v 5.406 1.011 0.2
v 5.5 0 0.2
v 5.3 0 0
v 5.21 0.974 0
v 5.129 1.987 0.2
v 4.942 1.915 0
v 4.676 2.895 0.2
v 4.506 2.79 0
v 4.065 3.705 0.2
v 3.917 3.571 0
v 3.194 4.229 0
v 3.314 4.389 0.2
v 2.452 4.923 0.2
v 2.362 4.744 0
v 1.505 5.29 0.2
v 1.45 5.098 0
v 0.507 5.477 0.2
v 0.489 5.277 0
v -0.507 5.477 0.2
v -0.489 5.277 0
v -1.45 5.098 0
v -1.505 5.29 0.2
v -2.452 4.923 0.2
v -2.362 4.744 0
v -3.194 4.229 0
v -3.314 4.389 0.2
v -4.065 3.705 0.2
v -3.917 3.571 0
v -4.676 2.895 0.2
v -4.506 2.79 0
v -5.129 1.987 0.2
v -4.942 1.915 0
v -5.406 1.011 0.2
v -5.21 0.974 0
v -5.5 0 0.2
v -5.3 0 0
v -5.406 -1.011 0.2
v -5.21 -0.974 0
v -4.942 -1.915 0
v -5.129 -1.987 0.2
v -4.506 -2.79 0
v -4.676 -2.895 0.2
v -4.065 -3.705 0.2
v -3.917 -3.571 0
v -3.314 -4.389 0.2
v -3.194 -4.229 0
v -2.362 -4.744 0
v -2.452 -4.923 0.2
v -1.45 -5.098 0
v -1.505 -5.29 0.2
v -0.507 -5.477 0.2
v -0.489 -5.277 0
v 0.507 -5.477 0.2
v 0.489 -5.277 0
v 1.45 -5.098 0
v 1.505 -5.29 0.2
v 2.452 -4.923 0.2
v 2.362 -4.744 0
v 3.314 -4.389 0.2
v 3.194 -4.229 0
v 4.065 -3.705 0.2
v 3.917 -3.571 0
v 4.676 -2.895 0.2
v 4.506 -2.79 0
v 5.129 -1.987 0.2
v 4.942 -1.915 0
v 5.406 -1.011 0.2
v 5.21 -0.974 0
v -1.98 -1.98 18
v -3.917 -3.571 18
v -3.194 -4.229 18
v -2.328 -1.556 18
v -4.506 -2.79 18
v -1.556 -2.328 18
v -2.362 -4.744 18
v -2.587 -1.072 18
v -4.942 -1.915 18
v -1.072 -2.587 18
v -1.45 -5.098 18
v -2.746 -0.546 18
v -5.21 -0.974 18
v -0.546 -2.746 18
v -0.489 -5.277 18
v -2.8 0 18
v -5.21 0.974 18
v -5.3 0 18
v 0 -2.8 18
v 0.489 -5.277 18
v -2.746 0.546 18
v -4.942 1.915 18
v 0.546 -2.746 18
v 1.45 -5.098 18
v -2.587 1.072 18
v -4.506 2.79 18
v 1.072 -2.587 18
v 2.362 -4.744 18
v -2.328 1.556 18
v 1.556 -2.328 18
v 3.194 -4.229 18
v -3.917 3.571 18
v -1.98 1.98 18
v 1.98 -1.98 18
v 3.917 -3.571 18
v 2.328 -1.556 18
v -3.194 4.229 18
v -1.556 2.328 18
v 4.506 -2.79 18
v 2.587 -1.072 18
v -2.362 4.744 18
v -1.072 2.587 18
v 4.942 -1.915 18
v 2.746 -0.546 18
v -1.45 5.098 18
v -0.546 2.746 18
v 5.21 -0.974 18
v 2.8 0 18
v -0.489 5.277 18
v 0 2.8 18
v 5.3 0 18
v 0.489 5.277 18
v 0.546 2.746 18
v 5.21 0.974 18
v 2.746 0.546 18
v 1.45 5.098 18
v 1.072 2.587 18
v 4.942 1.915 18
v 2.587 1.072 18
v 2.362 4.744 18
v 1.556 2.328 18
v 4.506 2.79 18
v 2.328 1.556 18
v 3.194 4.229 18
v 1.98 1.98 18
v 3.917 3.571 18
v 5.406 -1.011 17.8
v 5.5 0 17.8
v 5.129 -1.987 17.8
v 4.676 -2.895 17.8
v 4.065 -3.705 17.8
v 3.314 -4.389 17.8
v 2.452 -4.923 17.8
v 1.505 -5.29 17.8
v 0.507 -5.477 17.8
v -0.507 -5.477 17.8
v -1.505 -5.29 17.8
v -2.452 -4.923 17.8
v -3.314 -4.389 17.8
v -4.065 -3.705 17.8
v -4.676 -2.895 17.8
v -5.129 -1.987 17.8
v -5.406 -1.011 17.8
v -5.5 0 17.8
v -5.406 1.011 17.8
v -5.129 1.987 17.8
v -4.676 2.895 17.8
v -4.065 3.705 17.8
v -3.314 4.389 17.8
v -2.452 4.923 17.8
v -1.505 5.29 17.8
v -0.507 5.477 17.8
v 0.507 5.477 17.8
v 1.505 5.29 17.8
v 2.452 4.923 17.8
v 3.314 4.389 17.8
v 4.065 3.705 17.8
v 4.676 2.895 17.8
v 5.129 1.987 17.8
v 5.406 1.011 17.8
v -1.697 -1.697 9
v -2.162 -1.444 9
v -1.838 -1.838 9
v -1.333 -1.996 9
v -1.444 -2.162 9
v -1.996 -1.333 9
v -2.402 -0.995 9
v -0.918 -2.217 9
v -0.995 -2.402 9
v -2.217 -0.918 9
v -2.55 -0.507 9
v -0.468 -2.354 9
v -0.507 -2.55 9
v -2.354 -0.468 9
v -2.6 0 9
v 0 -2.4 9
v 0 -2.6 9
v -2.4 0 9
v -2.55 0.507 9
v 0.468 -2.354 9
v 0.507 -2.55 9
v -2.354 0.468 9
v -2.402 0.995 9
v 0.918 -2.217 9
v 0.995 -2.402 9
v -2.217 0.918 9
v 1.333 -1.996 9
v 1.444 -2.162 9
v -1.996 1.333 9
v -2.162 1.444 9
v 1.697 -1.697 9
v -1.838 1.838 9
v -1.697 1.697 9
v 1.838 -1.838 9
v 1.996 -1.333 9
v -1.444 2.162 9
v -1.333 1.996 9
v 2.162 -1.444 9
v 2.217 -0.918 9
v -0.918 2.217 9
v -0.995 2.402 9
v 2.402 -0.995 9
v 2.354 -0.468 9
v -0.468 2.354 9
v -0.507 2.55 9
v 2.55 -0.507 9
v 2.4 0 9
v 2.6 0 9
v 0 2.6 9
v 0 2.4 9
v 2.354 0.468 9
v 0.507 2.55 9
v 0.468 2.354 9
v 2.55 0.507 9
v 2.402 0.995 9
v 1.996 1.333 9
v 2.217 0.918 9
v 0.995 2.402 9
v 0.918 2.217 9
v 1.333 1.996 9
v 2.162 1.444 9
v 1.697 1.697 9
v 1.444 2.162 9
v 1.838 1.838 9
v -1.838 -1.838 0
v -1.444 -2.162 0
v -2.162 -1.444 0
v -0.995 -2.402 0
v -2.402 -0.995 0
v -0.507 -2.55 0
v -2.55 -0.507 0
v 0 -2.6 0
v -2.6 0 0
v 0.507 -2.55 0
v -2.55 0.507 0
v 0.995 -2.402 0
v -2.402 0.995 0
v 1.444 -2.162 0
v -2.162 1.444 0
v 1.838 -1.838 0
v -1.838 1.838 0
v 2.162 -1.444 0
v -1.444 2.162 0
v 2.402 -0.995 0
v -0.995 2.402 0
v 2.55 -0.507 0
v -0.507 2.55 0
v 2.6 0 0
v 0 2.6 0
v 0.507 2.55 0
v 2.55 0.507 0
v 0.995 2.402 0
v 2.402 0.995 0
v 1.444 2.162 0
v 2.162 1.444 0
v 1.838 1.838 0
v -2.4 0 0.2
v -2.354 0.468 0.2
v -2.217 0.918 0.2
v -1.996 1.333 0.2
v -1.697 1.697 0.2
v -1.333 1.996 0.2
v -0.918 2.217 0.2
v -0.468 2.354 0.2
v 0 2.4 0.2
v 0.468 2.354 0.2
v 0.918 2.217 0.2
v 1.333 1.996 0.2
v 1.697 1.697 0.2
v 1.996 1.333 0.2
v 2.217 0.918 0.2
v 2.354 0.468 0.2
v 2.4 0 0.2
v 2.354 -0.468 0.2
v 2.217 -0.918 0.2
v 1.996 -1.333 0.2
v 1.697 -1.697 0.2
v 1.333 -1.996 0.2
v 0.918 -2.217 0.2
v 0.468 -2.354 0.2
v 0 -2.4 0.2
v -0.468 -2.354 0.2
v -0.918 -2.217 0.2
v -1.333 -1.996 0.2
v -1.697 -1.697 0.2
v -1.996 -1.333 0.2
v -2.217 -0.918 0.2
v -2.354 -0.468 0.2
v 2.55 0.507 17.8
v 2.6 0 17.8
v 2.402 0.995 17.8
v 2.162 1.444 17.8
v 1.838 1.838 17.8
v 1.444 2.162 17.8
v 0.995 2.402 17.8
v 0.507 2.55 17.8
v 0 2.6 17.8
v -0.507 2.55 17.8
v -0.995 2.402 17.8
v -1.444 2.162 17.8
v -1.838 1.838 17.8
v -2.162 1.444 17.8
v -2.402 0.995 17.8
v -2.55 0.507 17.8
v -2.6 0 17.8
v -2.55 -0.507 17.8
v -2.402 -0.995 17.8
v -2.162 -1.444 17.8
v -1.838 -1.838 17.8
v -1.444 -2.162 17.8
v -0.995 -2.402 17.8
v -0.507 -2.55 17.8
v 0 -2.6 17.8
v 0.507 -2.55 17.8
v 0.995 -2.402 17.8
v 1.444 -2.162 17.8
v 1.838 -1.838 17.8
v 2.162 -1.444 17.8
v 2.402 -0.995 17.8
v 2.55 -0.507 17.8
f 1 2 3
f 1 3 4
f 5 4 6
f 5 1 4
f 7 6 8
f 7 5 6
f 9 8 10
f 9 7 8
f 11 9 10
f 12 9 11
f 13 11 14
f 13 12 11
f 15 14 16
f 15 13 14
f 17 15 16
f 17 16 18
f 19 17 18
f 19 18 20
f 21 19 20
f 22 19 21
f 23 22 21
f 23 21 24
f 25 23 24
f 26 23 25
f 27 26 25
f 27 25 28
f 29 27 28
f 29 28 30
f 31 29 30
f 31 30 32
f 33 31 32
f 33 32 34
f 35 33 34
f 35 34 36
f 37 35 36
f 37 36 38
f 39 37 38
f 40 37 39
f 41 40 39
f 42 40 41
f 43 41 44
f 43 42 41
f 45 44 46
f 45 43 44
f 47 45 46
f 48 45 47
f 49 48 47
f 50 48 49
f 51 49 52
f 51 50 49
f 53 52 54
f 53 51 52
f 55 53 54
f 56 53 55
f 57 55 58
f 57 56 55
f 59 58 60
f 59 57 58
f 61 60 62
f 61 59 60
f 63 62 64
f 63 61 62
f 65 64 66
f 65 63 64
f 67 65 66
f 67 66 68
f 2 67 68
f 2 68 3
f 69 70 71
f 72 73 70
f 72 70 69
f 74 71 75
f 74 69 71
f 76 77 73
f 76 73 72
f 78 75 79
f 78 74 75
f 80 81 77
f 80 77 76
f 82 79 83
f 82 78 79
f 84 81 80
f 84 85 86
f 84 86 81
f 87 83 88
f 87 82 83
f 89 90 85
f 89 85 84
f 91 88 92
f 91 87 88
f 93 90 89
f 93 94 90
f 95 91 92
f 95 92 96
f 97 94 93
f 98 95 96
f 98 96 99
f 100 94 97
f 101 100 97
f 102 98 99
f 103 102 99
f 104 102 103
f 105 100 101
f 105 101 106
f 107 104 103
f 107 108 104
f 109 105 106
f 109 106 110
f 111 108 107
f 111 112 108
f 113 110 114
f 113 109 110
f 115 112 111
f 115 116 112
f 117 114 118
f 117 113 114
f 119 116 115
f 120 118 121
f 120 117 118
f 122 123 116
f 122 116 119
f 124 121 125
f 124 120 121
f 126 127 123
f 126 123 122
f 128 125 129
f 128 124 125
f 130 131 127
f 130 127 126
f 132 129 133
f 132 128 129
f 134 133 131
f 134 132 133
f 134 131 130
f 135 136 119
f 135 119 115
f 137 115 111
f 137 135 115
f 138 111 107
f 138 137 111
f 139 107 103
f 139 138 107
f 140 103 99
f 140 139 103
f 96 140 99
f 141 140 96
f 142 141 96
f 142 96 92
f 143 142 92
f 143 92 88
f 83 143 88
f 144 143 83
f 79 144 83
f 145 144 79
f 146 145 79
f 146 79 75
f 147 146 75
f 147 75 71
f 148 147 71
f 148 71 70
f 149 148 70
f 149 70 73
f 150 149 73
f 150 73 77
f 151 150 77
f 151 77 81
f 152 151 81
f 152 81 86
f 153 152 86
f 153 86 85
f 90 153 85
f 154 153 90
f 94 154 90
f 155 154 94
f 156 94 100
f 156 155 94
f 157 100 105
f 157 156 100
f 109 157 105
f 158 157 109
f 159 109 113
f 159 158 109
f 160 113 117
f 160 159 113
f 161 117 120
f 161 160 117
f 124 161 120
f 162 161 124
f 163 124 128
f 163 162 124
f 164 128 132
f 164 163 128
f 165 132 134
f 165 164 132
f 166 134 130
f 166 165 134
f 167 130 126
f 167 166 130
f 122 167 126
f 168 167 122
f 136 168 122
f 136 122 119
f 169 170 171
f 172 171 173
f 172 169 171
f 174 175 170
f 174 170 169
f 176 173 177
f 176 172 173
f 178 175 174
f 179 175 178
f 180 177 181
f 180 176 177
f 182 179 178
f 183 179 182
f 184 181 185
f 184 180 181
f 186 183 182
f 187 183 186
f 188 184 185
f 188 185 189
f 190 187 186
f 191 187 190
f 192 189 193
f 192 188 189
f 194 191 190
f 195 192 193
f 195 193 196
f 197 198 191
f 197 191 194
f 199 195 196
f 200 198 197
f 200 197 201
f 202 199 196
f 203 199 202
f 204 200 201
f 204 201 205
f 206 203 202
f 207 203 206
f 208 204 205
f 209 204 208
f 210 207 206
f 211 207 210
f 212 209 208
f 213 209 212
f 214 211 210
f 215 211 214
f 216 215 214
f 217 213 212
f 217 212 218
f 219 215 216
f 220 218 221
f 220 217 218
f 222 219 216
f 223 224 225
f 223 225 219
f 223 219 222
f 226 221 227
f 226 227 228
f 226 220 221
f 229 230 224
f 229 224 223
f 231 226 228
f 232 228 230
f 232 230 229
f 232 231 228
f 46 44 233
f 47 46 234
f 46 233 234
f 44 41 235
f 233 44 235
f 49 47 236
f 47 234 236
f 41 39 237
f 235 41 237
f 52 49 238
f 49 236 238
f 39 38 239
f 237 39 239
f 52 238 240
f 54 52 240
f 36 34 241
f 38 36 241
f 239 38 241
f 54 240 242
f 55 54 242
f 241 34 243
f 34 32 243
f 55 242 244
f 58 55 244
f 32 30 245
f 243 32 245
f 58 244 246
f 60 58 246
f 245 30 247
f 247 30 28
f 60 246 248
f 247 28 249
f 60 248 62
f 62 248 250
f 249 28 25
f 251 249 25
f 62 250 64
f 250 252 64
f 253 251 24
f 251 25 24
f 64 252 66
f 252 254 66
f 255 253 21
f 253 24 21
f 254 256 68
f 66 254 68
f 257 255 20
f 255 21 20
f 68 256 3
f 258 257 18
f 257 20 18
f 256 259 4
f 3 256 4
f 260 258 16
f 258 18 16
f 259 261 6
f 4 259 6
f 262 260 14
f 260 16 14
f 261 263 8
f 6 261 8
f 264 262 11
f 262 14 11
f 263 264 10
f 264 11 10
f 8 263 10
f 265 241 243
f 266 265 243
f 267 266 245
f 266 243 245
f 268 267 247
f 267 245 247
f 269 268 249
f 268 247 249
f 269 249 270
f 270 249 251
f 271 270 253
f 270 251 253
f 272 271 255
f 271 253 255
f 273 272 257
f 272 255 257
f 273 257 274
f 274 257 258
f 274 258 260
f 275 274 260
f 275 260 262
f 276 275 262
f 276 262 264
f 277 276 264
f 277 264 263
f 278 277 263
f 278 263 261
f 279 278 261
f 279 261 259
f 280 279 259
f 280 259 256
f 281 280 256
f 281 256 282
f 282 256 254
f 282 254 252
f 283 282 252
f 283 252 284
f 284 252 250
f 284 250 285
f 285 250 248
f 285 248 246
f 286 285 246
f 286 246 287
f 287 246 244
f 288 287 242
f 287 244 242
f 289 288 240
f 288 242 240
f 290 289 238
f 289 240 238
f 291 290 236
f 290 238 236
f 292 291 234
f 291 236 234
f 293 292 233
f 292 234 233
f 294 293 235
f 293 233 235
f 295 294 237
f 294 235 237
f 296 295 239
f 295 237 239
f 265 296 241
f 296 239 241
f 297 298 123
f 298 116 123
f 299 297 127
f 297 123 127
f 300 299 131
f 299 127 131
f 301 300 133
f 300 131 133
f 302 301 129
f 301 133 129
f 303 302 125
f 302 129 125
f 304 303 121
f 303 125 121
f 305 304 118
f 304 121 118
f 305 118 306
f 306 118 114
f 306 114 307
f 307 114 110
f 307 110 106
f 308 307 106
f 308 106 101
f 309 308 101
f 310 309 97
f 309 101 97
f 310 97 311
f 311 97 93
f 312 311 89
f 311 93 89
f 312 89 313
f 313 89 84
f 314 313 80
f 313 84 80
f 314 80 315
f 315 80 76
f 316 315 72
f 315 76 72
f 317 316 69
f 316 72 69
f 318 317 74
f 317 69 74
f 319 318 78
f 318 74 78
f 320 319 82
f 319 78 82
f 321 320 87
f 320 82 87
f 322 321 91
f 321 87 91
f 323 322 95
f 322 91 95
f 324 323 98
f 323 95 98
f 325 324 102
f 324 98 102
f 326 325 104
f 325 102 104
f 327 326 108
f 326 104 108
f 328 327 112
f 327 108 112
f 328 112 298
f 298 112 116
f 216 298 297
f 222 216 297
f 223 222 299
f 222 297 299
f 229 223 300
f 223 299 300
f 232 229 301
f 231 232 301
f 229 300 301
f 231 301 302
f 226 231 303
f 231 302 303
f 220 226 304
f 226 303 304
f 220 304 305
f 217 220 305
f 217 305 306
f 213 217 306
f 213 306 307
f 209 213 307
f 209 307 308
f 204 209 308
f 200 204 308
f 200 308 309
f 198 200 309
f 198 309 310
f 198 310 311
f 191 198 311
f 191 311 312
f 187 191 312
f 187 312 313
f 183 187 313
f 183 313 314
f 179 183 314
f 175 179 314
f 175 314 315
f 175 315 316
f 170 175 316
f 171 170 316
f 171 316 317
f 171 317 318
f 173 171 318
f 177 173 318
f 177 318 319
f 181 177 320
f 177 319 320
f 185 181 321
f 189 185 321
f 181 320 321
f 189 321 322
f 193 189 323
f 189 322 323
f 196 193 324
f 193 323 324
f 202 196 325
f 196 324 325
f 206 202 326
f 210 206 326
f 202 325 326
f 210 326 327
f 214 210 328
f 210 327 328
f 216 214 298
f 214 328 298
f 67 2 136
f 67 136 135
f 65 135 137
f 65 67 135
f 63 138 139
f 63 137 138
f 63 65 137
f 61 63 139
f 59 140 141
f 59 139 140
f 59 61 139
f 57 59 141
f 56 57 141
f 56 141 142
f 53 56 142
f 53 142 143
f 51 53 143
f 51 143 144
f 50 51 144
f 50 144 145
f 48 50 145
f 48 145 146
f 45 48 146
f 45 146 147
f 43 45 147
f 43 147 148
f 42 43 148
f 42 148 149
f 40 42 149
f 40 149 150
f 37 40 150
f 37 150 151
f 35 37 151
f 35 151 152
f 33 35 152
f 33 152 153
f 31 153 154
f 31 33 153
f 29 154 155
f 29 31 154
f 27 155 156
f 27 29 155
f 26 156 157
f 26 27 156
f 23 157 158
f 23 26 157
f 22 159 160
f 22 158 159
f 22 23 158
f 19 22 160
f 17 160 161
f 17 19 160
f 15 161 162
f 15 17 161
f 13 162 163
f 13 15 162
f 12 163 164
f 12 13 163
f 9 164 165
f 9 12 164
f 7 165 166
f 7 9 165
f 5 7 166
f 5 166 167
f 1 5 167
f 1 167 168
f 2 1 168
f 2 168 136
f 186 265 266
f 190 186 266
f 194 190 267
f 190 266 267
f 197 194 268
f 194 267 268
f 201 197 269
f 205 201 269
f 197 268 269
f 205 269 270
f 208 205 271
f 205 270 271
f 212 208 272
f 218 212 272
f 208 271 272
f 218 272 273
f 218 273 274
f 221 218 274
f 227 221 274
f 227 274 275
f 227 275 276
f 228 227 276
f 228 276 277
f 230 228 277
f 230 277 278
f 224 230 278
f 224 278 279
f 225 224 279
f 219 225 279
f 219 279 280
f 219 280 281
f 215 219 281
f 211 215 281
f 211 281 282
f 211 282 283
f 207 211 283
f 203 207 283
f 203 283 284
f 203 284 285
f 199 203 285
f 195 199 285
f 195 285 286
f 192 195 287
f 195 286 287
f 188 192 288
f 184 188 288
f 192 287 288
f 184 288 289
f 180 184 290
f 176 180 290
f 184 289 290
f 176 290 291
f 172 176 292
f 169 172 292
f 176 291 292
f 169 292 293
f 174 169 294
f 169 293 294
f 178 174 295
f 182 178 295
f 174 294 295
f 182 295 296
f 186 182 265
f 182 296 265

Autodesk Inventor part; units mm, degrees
ref_plane "YZ Plane" through (0, 0, 0) normal (1, 0, 0) x (0, 1, 0)
ref_plane "XZ Plane" through (0, 0, 0) normal (0, 1, 0) x (-1, 0, 0)
ref_plane "XY Plane" through (0, 0, 0) normal (0, 0, 1) x (1, 0, 0)
sketch "Szkic1" plane through (0, 0, 0) normal (0, 0, 1) x (1, 0, 0)
  circle A0 centre (0, 0) radius 5.5
  dimension "d0" = 11
extrude "Wyciągnięcie proste1" add sketch "Szkic1" along normal blind 18
sketch "Szkic2" plane through (0, 0, 18) normal (0, 0, 1) x (1, 0, 0)
  circle A0 centre (0, 0) radius 2.6
  dimension "d3" = 5.2
extrude "Wyciągnięcie proste2" cut sketch "Szkic2" against normal blind 9
sketch "Szkic3" plane through (0, 0, 0) normal (0, 0, -1) x (-1, 0, 0)
  circle A0 centre (0, 0) radius 2.4
  dimension "d6" = 4.8
extrude "Wyciągnięcie proste3" cut sketch "Szkic3" against normal blind 9
chamfer "Faza1" distance 0.2 angle 45 4 edges at (-5.5, 0, 18) (-5.5, 0, 0) (2.4, 0, 0) (-2.6, 0, 18)
properties part number "wheel_tube"
